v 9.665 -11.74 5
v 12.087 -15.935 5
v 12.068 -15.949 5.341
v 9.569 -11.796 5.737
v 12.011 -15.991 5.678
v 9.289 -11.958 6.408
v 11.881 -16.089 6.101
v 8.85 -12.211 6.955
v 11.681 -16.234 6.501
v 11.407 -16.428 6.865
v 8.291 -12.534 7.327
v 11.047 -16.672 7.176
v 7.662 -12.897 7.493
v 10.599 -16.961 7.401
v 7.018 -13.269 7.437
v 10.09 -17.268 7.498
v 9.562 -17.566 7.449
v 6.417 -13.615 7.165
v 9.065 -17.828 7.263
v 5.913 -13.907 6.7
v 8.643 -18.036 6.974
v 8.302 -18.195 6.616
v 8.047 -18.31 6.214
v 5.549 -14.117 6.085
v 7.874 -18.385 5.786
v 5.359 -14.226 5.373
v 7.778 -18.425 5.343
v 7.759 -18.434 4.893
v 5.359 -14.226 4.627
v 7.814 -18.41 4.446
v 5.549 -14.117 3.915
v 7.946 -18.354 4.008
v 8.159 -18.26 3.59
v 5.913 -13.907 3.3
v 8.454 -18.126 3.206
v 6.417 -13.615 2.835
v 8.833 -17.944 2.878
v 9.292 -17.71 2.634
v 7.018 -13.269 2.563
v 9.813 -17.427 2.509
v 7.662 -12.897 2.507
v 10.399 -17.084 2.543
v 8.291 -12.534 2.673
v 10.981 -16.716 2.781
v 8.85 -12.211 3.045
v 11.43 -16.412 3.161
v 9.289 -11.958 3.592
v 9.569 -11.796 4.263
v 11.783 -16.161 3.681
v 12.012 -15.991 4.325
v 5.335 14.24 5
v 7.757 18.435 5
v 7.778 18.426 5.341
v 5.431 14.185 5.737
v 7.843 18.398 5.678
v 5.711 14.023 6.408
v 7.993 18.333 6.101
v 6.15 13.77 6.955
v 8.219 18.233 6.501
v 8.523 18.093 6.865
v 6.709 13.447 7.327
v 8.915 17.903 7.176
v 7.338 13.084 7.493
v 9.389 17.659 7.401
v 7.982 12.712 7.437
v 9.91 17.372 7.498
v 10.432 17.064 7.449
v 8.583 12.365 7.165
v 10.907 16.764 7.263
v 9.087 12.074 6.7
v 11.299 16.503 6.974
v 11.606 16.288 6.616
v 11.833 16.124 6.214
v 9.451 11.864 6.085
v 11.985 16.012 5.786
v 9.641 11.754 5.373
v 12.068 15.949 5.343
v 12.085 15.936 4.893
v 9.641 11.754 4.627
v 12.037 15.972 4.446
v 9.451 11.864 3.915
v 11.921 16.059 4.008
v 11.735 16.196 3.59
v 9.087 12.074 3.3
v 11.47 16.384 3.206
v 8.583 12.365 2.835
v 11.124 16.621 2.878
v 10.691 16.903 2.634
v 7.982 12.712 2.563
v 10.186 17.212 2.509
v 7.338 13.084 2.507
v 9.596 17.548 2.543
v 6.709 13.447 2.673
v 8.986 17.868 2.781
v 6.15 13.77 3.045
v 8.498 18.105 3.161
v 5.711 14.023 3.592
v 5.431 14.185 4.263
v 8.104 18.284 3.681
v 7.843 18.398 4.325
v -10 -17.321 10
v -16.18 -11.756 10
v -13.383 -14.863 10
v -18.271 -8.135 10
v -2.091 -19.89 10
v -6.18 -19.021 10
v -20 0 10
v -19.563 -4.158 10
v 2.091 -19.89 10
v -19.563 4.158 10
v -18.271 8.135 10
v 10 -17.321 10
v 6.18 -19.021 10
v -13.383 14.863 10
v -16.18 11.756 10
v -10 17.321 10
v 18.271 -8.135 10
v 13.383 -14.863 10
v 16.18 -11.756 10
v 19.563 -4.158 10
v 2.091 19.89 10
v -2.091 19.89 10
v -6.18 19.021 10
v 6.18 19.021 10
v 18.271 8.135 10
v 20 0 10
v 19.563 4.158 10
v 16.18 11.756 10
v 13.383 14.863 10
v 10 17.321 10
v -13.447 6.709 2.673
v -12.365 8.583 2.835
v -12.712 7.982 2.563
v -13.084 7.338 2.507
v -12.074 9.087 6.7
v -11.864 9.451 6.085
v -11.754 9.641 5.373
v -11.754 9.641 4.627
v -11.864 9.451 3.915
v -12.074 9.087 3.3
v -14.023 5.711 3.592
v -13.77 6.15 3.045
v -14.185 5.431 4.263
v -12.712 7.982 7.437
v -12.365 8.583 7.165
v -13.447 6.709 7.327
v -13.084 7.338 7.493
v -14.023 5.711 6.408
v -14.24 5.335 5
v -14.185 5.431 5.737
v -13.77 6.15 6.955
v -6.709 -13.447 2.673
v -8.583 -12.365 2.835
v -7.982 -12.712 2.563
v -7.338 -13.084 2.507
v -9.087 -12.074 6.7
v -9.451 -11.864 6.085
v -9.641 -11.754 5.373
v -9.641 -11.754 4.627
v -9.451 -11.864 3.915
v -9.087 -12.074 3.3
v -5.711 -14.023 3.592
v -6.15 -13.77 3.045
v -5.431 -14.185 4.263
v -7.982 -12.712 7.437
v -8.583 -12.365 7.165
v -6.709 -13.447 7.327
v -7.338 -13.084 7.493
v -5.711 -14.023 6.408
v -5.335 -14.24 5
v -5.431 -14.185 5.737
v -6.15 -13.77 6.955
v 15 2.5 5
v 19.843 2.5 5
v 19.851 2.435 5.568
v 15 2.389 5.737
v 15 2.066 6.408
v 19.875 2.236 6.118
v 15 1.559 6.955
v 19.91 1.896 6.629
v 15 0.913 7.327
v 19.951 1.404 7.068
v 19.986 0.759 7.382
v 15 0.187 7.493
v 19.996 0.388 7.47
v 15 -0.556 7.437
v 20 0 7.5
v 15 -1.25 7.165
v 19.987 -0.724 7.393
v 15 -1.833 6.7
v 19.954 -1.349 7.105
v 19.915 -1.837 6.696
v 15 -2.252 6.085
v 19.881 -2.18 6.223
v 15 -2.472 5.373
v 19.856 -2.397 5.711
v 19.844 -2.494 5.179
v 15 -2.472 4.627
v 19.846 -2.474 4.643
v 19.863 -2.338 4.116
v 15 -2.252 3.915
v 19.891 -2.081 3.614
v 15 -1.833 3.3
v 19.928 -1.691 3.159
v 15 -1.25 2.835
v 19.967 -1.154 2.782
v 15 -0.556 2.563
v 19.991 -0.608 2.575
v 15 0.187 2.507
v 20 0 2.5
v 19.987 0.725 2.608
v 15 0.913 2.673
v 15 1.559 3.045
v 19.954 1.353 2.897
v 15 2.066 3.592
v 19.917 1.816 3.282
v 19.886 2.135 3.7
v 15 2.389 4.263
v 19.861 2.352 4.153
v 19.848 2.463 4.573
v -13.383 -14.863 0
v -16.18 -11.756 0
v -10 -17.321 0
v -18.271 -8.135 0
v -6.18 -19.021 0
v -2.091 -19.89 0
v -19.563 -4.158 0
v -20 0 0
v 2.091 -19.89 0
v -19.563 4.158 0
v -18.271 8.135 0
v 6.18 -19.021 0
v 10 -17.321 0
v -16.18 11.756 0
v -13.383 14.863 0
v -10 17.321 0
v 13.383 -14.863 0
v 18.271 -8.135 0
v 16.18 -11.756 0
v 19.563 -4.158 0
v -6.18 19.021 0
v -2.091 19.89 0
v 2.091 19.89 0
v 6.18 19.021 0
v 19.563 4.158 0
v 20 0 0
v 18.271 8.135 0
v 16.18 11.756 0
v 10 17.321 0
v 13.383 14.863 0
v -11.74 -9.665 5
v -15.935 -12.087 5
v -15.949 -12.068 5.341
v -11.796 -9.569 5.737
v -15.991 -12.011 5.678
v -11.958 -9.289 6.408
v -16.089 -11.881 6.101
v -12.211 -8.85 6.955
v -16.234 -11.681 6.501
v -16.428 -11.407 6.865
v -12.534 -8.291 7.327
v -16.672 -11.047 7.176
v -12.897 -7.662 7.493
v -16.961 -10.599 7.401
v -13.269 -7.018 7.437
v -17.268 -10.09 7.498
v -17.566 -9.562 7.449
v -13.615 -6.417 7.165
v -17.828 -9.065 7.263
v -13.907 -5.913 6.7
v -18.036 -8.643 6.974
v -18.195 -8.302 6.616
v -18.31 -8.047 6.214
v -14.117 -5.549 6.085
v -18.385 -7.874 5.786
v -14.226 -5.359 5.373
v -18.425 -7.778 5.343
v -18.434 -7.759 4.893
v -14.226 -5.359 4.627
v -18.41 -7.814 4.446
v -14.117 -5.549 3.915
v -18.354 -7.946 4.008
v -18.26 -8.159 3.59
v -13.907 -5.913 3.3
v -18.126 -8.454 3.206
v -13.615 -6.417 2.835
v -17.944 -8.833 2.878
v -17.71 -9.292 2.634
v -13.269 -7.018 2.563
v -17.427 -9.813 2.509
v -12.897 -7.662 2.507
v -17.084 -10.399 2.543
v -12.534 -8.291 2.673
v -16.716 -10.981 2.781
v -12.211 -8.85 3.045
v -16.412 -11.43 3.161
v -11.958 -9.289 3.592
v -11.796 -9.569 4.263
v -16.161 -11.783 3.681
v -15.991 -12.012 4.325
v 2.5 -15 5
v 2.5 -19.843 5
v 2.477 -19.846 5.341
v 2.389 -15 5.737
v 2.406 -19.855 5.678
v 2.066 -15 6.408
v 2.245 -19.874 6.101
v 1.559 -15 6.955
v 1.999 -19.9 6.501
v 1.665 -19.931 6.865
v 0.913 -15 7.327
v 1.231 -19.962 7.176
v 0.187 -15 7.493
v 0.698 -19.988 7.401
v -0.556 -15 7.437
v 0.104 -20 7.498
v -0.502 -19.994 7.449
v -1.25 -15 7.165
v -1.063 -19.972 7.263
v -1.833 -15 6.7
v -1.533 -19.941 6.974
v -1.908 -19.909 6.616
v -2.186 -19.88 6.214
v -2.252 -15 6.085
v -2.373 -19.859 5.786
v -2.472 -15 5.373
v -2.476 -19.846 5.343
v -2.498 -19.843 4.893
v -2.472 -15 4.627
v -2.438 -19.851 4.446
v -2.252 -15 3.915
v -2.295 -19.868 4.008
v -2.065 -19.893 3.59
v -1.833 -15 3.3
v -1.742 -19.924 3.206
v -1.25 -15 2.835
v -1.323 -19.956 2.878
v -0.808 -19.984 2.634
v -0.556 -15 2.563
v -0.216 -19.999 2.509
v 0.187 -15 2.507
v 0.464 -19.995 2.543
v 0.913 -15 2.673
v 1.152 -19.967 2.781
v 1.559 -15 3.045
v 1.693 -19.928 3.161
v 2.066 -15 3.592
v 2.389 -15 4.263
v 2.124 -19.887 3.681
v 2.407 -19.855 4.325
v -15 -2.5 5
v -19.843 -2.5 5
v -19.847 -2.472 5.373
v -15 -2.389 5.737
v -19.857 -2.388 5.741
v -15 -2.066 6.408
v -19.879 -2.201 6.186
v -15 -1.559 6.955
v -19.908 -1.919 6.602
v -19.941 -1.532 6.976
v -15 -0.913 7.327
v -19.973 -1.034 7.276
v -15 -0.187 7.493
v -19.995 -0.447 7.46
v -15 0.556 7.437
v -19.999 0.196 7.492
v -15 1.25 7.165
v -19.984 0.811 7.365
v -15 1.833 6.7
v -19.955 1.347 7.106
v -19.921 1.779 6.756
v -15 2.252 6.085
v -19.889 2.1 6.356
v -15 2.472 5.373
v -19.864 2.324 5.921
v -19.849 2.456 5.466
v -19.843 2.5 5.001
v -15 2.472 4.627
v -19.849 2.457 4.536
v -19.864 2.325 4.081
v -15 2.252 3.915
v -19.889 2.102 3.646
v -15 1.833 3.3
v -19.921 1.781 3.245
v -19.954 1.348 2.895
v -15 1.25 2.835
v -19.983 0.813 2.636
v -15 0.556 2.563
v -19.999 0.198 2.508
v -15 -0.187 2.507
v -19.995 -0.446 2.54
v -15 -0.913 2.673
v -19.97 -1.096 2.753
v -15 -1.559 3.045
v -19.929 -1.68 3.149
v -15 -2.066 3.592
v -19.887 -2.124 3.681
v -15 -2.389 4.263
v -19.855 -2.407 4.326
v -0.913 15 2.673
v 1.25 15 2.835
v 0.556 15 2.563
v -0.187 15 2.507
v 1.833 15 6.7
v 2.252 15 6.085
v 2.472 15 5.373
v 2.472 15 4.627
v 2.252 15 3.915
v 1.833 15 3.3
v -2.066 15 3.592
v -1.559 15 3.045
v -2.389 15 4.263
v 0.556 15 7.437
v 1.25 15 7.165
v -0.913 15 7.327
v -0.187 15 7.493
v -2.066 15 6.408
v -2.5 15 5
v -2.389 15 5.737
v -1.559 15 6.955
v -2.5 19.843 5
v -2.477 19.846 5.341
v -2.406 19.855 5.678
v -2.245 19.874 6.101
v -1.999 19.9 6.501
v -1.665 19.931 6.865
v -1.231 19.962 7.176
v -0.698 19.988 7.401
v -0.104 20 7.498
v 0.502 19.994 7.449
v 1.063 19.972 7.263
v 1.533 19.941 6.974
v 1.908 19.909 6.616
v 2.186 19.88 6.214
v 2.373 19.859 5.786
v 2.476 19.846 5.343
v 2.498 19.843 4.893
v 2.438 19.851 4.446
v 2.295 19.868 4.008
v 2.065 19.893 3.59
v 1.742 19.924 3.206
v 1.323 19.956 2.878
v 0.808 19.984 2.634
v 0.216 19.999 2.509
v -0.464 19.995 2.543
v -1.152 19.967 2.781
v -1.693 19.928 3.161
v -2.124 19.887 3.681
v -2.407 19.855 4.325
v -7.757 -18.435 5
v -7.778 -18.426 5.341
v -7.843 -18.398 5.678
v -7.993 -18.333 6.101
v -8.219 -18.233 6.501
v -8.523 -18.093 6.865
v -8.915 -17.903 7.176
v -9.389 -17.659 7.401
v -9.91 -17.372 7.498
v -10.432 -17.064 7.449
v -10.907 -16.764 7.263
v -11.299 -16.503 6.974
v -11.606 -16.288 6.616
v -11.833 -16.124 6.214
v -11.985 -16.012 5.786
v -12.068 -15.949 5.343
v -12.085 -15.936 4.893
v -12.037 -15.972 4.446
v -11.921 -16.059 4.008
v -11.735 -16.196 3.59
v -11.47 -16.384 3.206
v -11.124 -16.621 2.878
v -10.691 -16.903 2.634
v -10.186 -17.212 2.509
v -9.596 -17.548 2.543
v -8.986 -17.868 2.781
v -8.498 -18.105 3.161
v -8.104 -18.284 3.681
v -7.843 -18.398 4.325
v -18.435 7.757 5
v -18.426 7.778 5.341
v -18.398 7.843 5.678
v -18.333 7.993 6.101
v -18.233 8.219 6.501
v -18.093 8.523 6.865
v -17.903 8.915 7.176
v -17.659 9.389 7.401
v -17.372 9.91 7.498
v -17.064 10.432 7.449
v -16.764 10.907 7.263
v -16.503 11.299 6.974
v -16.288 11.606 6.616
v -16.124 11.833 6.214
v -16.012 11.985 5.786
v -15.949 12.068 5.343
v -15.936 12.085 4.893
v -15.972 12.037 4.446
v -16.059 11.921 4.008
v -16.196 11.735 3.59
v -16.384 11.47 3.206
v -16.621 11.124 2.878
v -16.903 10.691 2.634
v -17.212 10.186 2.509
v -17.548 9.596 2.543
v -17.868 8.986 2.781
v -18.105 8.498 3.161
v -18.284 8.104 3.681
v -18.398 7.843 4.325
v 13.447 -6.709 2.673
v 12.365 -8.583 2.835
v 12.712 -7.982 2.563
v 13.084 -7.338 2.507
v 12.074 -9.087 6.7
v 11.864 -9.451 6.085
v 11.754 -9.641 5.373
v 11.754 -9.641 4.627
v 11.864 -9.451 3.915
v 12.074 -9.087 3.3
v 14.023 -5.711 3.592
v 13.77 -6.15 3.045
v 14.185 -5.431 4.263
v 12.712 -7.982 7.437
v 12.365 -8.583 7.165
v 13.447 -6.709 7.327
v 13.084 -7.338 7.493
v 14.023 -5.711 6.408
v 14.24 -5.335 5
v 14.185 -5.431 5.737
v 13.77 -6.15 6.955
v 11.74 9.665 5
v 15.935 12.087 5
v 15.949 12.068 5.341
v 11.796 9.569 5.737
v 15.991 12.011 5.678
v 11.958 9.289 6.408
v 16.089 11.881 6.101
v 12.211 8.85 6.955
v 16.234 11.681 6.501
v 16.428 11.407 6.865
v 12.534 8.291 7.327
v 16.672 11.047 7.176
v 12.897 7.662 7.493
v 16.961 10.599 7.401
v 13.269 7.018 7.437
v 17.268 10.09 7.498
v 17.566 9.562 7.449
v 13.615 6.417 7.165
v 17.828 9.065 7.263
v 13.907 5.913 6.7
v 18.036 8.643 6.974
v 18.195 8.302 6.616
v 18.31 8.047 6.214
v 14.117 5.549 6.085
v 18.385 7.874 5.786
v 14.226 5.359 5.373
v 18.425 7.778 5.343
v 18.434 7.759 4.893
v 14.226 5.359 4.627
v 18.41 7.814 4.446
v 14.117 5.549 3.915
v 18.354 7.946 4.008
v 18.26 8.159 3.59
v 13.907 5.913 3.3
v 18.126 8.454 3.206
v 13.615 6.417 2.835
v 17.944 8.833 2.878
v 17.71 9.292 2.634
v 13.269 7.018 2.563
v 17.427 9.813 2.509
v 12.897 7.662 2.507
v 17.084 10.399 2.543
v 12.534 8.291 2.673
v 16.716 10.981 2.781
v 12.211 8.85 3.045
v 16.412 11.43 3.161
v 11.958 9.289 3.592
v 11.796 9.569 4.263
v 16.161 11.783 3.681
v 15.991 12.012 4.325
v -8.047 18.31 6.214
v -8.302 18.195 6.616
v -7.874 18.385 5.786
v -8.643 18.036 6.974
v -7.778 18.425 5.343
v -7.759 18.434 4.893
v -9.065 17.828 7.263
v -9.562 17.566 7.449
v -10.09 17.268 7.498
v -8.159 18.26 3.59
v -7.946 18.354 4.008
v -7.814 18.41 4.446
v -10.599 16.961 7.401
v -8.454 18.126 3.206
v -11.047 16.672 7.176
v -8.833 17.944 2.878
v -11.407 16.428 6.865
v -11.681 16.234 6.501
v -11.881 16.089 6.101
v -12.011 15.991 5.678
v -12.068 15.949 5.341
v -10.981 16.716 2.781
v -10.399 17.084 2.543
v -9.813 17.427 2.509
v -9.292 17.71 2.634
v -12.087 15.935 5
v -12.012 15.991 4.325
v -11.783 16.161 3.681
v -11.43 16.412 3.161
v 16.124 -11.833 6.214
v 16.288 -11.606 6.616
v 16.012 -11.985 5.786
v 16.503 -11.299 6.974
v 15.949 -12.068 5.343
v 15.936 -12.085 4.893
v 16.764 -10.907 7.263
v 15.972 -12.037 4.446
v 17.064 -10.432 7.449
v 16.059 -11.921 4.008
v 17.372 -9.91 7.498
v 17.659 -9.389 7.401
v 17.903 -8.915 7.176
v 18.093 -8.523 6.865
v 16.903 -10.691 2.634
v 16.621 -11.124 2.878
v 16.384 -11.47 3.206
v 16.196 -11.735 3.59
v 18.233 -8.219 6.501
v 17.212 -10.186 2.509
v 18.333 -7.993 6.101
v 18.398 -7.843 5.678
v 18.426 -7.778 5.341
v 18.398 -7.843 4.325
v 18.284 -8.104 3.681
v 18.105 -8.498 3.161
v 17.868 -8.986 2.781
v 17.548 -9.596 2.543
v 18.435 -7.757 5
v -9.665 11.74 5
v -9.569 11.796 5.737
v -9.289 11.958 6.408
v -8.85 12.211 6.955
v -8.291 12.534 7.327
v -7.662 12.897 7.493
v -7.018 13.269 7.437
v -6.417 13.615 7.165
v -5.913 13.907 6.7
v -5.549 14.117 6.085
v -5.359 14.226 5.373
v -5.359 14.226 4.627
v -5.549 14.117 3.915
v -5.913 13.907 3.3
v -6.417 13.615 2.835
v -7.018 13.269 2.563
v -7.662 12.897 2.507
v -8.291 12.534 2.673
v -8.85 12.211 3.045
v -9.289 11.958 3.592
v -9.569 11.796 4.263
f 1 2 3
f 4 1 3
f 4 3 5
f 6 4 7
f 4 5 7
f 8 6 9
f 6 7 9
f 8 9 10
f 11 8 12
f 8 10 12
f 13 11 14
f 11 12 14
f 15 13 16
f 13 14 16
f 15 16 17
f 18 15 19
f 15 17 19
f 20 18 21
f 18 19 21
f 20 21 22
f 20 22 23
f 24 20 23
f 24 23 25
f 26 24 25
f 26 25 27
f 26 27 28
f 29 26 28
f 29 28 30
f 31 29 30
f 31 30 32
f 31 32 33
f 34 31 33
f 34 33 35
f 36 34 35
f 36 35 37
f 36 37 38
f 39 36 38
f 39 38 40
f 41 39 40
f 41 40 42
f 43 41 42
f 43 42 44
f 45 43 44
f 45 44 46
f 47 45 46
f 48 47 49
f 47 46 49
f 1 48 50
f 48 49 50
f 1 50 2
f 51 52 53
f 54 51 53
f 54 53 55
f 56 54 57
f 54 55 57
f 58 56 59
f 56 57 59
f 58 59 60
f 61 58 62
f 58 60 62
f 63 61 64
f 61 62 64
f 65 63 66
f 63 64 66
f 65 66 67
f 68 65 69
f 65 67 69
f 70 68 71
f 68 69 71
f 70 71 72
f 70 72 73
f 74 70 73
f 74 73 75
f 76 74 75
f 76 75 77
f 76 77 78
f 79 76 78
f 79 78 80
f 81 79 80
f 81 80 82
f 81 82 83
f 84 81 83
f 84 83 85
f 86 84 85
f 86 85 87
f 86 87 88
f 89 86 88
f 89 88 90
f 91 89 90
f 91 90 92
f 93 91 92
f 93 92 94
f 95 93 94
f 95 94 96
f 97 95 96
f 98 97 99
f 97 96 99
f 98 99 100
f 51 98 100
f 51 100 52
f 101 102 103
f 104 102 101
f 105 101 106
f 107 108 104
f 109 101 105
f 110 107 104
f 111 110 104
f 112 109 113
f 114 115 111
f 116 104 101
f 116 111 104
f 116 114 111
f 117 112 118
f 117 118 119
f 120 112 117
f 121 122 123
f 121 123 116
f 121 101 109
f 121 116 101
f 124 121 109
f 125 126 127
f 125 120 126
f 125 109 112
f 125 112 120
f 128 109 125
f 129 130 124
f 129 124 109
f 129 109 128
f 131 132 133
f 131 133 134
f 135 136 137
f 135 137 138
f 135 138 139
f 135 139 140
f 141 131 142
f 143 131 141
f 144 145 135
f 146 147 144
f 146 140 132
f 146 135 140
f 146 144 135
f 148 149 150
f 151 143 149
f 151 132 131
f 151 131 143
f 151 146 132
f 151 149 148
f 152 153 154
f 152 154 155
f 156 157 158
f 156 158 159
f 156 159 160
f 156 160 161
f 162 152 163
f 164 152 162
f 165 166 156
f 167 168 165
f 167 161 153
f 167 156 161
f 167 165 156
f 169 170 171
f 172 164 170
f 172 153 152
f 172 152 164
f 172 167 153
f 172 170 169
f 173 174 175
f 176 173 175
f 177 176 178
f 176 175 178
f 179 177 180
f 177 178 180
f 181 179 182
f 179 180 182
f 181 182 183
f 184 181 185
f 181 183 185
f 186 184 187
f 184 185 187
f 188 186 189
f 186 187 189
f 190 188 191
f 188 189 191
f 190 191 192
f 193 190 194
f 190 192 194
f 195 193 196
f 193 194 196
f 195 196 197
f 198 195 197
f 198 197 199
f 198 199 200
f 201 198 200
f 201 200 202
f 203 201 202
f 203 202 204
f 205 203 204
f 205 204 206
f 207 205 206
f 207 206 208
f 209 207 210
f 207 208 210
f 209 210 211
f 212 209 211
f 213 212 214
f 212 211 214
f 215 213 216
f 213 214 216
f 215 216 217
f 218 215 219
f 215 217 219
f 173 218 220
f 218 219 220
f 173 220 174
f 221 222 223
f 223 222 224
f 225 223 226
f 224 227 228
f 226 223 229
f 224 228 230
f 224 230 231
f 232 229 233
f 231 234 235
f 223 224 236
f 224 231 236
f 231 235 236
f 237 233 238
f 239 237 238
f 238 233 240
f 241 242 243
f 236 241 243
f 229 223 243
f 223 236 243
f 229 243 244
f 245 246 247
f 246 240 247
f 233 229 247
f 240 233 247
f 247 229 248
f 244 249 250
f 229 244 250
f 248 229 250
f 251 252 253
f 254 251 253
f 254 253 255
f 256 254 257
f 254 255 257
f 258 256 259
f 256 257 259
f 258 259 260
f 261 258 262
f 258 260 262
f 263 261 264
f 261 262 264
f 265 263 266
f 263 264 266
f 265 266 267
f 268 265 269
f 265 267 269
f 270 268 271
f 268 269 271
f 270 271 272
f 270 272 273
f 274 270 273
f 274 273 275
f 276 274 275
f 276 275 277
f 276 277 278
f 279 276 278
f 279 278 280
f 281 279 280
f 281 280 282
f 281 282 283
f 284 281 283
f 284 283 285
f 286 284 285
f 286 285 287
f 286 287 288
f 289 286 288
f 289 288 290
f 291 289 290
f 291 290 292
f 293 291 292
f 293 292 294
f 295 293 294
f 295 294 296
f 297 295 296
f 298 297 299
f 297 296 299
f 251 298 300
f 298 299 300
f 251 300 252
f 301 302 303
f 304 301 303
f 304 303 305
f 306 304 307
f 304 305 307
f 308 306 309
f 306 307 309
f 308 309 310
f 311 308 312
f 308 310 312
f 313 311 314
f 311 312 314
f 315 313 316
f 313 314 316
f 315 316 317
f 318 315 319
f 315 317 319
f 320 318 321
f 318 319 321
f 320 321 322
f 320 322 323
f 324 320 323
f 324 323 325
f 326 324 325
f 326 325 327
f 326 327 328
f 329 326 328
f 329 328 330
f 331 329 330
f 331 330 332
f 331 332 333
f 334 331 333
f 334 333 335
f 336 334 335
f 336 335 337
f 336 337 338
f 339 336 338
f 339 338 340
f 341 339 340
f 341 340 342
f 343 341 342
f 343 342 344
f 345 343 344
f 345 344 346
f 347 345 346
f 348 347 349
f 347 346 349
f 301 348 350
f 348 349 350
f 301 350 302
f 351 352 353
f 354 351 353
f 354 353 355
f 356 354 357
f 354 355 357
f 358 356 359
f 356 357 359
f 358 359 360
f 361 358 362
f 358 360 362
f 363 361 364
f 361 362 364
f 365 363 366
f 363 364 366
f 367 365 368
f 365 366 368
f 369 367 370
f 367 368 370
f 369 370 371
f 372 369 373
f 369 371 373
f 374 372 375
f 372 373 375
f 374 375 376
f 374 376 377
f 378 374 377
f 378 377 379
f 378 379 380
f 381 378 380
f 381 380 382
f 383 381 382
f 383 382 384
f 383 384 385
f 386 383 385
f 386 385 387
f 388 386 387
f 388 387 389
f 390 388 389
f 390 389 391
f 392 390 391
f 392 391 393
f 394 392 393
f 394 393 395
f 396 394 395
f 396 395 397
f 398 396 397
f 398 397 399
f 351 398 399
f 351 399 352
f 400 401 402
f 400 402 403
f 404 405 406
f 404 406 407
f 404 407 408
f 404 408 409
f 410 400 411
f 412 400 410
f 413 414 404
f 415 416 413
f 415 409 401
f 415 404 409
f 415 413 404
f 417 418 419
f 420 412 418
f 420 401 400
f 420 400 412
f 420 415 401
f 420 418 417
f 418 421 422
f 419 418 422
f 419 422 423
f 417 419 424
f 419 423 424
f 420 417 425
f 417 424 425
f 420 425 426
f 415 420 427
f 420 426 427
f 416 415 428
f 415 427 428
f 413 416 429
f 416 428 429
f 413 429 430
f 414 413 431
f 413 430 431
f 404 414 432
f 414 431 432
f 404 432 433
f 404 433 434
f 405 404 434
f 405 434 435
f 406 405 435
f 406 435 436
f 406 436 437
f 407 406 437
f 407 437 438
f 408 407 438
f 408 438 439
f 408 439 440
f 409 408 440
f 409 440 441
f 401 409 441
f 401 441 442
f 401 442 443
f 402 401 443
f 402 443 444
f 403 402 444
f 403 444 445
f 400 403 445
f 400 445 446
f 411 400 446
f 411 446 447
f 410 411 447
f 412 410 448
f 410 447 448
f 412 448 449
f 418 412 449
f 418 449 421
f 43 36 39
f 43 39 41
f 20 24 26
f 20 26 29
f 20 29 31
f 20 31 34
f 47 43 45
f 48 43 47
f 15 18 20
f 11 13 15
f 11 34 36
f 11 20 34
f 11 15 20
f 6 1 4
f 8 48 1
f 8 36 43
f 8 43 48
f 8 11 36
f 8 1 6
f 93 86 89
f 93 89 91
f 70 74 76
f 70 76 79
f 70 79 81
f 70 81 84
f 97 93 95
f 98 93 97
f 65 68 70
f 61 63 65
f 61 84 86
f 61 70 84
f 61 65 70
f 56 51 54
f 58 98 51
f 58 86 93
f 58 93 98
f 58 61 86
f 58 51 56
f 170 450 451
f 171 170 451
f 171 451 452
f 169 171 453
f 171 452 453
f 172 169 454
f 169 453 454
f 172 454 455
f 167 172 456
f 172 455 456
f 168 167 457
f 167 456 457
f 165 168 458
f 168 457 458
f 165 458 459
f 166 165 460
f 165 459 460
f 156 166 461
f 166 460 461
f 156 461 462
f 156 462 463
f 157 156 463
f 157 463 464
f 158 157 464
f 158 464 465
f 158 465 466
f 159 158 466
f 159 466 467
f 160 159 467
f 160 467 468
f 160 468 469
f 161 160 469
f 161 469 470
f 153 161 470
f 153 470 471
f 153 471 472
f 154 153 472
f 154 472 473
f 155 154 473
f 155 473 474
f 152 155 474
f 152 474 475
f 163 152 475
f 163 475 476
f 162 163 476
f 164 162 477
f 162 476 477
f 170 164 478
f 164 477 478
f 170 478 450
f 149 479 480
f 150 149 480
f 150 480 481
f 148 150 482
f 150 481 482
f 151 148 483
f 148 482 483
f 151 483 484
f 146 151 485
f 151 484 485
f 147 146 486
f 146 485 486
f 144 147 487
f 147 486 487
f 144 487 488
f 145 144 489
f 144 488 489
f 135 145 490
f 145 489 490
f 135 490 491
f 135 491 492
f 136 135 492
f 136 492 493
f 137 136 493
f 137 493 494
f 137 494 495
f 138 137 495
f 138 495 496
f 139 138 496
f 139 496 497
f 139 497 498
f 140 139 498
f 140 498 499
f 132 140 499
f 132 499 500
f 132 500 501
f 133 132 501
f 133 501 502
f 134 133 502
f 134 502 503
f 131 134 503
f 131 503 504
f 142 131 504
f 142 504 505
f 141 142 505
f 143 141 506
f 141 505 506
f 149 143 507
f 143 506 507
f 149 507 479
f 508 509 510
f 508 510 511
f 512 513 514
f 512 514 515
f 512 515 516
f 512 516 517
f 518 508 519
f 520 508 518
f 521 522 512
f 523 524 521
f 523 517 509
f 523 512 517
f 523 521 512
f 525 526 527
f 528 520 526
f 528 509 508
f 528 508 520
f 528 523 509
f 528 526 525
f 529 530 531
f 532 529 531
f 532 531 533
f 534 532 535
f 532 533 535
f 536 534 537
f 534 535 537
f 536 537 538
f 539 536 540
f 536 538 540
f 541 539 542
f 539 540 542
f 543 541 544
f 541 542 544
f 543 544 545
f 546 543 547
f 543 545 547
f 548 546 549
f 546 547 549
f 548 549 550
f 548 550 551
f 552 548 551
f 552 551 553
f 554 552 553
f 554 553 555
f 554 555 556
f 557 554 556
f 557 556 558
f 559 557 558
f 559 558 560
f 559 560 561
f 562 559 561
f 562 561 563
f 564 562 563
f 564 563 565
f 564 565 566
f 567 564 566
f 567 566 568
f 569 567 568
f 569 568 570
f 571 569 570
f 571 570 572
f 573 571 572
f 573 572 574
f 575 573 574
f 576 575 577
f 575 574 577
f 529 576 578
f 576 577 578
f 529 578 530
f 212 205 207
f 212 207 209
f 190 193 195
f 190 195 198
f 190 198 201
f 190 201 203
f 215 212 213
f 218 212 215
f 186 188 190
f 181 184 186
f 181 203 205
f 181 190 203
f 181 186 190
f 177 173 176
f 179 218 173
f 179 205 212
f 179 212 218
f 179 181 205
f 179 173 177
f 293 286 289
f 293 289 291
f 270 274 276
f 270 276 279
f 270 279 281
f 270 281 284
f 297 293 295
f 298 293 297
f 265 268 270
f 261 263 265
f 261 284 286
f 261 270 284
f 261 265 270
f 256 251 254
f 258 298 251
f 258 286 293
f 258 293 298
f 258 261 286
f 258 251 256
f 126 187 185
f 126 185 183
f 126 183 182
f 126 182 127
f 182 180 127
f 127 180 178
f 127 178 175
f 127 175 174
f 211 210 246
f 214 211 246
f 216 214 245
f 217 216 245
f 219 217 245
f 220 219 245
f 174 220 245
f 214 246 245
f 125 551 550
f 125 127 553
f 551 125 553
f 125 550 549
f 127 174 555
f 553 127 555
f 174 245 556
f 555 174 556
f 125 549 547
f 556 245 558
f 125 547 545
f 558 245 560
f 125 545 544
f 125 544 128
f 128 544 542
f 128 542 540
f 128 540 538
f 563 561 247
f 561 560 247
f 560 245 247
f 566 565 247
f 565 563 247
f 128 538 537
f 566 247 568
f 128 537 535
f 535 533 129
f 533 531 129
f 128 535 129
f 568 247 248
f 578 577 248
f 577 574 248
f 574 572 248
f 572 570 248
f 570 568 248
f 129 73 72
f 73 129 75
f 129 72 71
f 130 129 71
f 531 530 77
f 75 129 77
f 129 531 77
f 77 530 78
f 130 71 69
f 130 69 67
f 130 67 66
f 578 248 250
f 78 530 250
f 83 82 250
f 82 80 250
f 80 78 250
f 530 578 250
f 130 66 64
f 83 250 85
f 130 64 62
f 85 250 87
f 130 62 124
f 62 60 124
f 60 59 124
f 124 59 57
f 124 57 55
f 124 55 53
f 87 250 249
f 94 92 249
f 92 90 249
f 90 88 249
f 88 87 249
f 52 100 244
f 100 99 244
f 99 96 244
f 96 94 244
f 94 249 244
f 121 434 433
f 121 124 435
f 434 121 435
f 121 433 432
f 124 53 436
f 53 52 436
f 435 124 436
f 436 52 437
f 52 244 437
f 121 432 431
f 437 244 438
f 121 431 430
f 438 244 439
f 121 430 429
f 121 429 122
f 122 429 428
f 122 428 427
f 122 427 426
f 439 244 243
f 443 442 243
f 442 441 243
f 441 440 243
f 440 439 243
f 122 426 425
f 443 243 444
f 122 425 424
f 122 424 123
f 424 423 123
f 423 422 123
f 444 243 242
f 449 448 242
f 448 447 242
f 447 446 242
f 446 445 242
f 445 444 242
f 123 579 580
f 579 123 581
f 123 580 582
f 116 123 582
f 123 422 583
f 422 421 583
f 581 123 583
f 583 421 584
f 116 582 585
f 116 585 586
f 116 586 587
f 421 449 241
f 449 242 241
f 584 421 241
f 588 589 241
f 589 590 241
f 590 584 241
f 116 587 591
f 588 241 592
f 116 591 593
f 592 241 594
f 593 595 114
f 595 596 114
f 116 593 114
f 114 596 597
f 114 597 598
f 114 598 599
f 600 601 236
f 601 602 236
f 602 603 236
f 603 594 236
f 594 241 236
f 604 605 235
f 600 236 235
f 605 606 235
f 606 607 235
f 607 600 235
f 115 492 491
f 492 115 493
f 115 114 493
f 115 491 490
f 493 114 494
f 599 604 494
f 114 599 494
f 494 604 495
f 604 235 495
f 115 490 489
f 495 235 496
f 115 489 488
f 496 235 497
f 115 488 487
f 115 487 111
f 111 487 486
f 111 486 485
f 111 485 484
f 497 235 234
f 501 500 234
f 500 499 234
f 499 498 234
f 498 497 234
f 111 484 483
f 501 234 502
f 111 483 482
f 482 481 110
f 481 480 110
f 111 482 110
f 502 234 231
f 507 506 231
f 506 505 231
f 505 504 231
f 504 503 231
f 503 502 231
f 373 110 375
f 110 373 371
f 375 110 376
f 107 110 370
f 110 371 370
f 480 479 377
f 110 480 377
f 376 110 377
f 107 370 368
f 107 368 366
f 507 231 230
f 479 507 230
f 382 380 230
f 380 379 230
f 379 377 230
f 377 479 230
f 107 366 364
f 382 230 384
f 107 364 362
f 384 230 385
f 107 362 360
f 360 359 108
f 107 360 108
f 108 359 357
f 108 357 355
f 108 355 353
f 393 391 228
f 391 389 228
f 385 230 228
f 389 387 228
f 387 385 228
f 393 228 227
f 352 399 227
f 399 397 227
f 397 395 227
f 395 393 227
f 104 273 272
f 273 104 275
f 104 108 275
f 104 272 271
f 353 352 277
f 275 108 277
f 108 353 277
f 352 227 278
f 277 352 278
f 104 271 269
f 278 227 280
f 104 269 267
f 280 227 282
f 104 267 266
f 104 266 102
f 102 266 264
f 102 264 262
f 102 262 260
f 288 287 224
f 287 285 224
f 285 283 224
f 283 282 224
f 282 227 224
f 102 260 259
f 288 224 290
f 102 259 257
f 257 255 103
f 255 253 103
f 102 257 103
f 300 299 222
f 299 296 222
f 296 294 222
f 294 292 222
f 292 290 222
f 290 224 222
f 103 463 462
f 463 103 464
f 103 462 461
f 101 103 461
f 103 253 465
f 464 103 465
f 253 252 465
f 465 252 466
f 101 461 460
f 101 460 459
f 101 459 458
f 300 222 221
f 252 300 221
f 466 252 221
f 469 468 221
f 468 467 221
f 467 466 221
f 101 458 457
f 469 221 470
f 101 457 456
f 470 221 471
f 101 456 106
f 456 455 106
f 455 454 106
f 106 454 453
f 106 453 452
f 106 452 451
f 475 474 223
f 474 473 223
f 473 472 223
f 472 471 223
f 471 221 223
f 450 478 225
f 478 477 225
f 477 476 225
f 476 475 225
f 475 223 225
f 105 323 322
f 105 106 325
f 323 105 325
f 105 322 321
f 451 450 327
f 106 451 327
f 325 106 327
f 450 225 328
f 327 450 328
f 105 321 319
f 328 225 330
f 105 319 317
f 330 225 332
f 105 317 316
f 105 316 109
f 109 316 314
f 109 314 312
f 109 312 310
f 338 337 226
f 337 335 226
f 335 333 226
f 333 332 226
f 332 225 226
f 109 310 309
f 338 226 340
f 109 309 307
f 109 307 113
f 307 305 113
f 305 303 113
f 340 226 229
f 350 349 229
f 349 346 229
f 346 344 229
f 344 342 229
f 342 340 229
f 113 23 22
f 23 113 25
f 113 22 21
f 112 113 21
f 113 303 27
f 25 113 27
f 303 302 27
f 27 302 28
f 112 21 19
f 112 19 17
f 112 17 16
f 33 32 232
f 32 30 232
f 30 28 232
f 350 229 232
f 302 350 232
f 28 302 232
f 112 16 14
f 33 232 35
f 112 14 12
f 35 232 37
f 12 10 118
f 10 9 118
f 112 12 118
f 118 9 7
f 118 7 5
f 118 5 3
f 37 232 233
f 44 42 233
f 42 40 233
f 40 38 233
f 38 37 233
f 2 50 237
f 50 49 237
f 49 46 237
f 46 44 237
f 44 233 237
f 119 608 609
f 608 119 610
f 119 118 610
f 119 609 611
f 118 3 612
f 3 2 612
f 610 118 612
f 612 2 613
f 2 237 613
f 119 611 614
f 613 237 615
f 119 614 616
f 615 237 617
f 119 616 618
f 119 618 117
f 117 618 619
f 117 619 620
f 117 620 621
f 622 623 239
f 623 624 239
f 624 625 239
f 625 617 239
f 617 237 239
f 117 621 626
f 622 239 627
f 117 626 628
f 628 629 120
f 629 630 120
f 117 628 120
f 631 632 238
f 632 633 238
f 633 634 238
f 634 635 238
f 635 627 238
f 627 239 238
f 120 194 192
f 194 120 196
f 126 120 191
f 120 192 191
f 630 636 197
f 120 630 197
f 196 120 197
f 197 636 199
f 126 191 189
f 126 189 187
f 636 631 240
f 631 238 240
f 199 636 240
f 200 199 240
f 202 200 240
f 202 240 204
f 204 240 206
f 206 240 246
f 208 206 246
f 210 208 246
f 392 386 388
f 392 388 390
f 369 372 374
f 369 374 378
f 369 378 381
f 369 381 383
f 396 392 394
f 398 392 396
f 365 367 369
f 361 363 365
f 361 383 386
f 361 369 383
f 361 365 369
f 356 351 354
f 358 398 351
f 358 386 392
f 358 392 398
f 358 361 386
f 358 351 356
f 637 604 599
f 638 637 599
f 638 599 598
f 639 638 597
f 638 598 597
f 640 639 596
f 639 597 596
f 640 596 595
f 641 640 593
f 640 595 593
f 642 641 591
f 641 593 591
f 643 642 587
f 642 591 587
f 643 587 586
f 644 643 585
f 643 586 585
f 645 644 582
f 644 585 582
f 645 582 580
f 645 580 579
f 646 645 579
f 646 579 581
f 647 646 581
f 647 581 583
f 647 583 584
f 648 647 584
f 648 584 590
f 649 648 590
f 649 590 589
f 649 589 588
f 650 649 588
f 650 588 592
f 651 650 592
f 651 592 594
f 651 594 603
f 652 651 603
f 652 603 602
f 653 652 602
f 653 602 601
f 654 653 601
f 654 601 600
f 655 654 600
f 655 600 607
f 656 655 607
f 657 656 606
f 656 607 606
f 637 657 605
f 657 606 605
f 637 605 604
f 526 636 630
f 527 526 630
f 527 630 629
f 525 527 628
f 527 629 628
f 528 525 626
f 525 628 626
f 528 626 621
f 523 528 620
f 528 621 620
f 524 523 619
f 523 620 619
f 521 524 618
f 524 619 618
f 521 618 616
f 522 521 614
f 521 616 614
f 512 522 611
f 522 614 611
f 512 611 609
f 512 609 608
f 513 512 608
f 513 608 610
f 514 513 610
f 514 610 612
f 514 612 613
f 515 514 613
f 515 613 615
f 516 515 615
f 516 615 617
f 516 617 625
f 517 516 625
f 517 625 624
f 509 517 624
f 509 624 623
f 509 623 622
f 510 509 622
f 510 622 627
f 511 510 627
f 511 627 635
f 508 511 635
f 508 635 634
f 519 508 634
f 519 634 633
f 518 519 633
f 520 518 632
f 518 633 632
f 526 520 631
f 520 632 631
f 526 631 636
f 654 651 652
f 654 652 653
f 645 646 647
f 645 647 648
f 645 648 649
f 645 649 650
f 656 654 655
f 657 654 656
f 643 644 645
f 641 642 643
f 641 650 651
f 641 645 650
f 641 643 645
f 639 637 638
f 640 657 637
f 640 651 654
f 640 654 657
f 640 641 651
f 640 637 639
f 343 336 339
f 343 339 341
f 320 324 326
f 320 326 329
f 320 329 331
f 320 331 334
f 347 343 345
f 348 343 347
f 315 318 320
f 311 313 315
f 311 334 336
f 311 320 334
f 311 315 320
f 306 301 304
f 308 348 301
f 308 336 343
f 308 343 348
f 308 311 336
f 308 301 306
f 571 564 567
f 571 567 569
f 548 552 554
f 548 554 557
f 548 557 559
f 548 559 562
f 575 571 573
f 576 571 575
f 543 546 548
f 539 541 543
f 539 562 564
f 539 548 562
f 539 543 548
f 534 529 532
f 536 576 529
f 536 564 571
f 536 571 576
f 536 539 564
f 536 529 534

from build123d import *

# Parameters (mm, degrees)
F0_R     = 20
F1_DEPTH = 10
F3_R     = 2.5
F4_DEPTH = 5
F6_COUNT = 12


with BuildPart() as f1:
    # F0 (on Top) → F1 (new body)
    with BuildSketch(Plane.XY):
        Circle(F0_R)
    extrude(amount=F1_DEPTH)


with BuildPart() as f4:
    # F3 (on offset) → F4 (new body)
    with BuildSketch(Plane.XZ.offset(20)):
        with Locations((0, 5)):
            Circle(F3_R)
    extrude(amount=-F4_DEPTH)


with BuildPart() as f6_1:
    # F6: instance of F4
    add(f4.part.rotate(Axis((0, 0, 0), (0, 0, -1)), 1 * 360 / F6_COUNT))


with BuildPart() as f6_2:
    # F6: instance of F4
    add(f4.part.rotate(Axis((0, 0, 0), (0, 0, -1)), 2 * 360 / F6_COUNT))


with BuildPart() as f6_3:
    # F6: instance of F4
    add(f4.part.rotate(Axis((0, 0, 0), (0, 0, -1)), 3 * 360 / F6_COUNT))


with BuildPart() as f6_4:
    # F6: instance of F4
    add(f4.part.rotate(Axis((0, 0, 0), (0, 0, -1)), 4 * 360 / F6_COUNT))


with BuildPart() as f6_5:
    # F6: instance of F4
    add(f4.part.rotate(Axis((0, 0, 0), (0, 0, -1)), 5 * 360 / F6_COUNT))


with BuildPart() as f6_6:
    # F6: instance of F4
    add(f4.part.rotate(Axis((0, 0, 0), (0, 0, -1)), 6 * 360 / F6_COUNT))


with BuildPart() as f6_7:
    # F6: instance of F4
    add(f4.part.rotate(Axis((0, 0, 0), (0, 0, -1)), 7 * 360 / F6_COUNT))


with BuildPart() as f6_8:
    # F6: instance of F4
    add(f4.part.rotate(Axis((0, 0, 0), (0, 0, -1)), 8 * 360 / F6_COUNT))


with BuildPart() as f6_9:
    # F6: instance of F4
    add(f4.part.rotate(Axis((0, 0, 0), (0, 0, -1)), 9 * 360 / F6_COUNT))


with BuildPart() as f6_10:
    # F6: instance of F4
    add(f4.part.rotate(Axis((0, 0, 0), (0, 0, -1)), 10 * 360 / F6_COUNT))


with BuildPart() as f6_11:
    # F6: instance of F4
    add(f4.part.rotate(Axis((0, 0, 0), (0, 0, -1)), 11 * 360 / F6_COUNT))


with BuildPart() as f1_1:
    add(f1.part)

    # F7: cut F6_2, F6_1, F4, F6_11, F6_3, F6_9, F6_10, F6_8, F6_4, F6_5, F6_6, F6_7
    add(f6_2.part, mode=Mode.SUBTRACT)
    add(f6_1.part, mode=Mode.SUBTRACT)
    add(f4.part, mode=Mode.SUBTRACT)
    add(f6_11.part, mode=Mode.SUBTRACT)
    add(f6_3.part, mode=Mode.SUBTRACT)
    add(f6_9.part, mode=Mode.SUBTRACT)
    add(f6_10.part, mode=Mode.SUBTRACT)
    add(f6_8.part, mode=Mode.SUBTRACT)
    add(f6_4.part, mode=Mode.SUBTRACT)
    add(f6_5.part, mode=Mode.SUBTRACT)
    add(f6_6.part, mode=Mode.SUBTRACT)
    add(f6_7.part, mode=Mode.SUBTRACT)


solid = f1_1.part
